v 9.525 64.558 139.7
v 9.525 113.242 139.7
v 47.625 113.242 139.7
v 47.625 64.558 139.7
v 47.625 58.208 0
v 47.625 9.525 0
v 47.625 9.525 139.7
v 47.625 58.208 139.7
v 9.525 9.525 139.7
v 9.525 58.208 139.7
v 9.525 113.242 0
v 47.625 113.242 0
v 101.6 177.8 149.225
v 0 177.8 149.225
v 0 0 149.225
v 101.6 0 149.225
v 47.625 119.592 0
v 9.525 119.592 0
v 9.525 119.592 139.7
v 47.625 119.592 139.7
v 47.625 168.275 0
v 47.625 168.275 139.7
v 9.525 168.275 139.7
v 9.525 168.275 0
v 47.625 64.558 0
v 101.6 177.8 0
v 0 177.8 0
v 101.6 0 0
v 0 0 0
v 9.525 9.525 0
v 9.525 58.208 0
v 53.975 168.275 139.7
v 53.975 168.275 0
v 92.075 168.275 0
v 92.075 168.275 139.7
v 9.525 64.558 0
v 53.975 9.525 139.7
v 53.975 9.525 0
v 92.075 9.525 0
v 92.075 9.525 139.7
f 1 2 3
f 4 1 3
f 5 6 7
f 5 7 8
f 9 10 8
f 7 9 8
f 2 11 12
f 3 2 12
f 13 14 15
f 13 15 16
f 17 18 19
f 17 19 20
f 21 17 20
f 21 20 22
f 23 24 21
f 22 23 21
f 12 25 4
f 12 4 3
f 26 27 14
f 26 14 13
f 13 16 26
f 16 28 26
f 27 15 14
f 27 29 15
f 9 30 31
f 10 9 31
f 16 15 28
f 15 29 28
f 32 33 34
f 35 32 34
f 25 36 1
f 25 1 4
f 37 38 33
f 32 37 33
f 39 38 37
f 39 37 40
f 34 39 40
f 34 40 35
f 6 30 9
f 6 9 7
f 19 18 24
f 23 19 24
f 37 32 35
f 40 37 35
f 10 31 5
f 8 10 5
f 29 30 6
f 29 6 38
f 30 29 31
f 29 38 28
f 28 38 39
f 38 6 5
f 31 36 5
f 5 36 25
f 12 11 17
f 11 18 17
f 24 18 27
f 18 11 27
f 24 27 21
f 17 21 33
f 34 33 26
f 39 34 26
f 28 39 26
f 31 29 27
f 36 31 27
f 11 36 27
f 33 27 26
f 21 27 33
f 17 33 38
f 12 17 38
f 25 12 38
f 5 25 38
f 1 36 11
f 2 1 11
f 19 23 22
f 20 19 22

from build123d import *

# Parameters (mm, degrees)
F1_W     = 101.6
F1_H     = 177.8
F1_W_2   = 38.1
F1_H_2   = 48.6833333333
F1_H_3   = 158.75
F2_DEPTH = 139.7
F3_W     = 101.6
F3_H     = 177.8
F4_DEPTH = 9.525


# Not quite as in the source:
# - a variable given as a bare number and used for a length is read in inches; the dataset says mm whatever the document's units were


with BuildPart() as f2:
    # F1 (on Top) → F2 (new body)
    with BuildSketch(Plane.XY):
        with Locations((50.8, 88.9)):
            Rectangle(F1_W, F1_H)
        with Locations((28.575, 33.8666666667)):
            Rectangle(F1_W_2, F1_H_2, mode=Mode.SUBTRACT)
        with Locations((28.575, 88.9)):
            Rectangle(F1_W_2, F1_H_2, mode=Mode.SUBTRACT)
        with Locations((28.575, 143.9333333333)):
            Rectangle(F1_W_2, F1_H_2, mode=Mode.SUBTRACT)
        with Locations((73.025, 88.9)):
            Rectangle(F1_W_2, F1_H_3, mode=Mode.SUBTRACT)
    extrude(amount=F2_DEPTH)

    # F3 (on face) → F4 (join)
    with BuildSketch(Plane.XY.offset(139.7)):
        with Locations((50.8, 88.9)):
            Rectangle(F3_W, F3_H)
    extrude(amount=F4_DEPTH)


solid = f2.part
